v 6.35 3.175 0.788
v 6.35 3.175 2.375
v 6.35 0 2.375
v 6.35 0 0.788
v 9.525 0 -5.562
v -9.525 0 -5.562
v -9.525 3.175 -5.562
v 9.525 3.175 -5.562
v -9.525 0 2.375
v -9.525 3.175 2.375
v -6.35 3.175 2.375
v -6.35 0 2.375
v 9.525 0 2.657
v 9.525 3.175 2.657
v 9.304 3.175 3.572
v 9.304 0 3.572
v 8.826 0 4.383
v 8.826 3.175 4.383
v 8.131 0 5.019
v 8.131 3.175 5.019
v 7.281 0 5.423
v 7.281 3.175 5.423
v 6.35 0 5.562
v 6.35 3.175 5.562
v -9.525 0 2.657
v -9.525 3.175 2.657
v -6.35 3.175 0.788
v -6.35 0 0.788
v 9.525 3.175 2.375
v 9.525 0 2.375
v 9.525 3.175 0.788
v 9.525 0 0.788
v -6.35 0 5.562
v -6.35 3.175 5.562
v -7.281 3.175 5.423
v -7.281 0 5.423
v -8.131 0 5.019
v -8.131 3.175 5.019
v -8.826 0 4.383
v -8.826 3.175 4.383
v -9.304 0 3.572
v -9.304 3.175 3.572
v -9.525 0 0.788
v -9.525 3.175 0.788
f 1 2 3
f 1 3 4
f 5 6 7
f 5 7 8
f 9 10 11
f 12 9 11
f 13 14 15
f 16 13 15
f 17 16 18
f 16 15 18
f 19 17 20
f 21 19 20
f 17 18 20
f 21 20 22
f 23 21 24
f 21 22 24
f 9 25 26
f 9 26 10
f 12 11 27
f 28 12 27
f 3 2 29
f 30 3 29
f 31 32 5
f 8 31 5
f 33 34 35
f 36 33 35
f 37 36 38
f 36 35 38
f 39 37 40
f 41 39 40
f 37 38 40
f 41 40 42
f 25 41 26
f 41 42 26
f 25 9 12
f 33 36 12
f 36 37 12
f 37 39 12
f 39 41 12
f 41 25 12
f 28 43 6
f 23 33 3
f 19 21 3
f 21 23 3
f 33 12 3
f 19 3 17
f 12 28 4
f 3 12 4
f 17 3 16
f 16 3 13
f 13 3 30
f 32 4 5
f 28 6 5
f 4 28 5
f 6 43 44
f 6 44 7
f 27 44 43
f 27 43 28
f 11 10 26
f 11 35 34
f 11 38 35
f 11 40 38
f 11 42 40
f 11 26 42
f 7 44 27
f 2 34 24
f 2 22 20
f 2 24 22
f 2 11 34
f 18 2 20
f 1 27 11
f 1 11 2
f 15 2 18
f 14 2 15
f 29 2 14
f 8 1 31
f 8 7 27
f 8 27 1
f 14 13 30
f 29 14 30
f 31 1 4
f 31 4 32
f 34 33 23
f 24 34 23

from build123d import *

# Parameters (mm, degrees)
SKETCH1_W           = 19.05
SKETCH1_H           = 11.125
BOSS_EXTRUDE1_DEPTH = 3.175
SKETCH2_W           = 3.175
SKETCH2_H           = 1.5875
CUT_EXTRUDE2_DEPTH  = 3.175


with BuildPart() as part:
    # Sketch1 → Boss-Extrude1 (new body)
    with BuildSketch(Plane(origin=(0, 0, 0), x_dir=(1, 0, 0), z_dir=(0, 1, 0))):
        Rectangle(SKETCH1_W, SKETCH1_H)
    extrude(amount=BOSS_EXTRUDE1_DEPTH)

    # Sketch2 → Cut-Extrude2 (cut)
    with BuildSketch(Plane(origin=(0, 3.175, 0), x_dir=(1, 0, 0), z_dir=(0, 1, 0))):
        with Locations((-7.9375, -1.58125)):
            Rectangle(SKETCH2_W, SKETCH2_H)
        with BuildLine():
            ThreePointArc((-6.35, -5.5625), (-8.501887576, -4.726496568), (-9.525, -2.657012854))
            Line((-9.525, -2.657012854), (-9.525, -5.5625))
            Line((-9.525, -5.5625), (-6.35, -5.5625))
        make_face()
        with BuildLine():
            Line((9.525, -5.5625), (9.525, -2.657012854))
            ThreePointArc((9.525, -2.657012854), (8.501887576, -4.726496568), (6.35, -5.5625))
            Line((6.35, -5.5625), (9.525, -5.5625))
        make_face()
        with Locations((7.9375, -1.58125)):
            Rectangle(SKETCH2_W, SKETCH2_H)
    extrude(amount=-CUT_EXTRUDE2_DEPTH, mode=Mode.SUBTRACT)


solid = part.part
